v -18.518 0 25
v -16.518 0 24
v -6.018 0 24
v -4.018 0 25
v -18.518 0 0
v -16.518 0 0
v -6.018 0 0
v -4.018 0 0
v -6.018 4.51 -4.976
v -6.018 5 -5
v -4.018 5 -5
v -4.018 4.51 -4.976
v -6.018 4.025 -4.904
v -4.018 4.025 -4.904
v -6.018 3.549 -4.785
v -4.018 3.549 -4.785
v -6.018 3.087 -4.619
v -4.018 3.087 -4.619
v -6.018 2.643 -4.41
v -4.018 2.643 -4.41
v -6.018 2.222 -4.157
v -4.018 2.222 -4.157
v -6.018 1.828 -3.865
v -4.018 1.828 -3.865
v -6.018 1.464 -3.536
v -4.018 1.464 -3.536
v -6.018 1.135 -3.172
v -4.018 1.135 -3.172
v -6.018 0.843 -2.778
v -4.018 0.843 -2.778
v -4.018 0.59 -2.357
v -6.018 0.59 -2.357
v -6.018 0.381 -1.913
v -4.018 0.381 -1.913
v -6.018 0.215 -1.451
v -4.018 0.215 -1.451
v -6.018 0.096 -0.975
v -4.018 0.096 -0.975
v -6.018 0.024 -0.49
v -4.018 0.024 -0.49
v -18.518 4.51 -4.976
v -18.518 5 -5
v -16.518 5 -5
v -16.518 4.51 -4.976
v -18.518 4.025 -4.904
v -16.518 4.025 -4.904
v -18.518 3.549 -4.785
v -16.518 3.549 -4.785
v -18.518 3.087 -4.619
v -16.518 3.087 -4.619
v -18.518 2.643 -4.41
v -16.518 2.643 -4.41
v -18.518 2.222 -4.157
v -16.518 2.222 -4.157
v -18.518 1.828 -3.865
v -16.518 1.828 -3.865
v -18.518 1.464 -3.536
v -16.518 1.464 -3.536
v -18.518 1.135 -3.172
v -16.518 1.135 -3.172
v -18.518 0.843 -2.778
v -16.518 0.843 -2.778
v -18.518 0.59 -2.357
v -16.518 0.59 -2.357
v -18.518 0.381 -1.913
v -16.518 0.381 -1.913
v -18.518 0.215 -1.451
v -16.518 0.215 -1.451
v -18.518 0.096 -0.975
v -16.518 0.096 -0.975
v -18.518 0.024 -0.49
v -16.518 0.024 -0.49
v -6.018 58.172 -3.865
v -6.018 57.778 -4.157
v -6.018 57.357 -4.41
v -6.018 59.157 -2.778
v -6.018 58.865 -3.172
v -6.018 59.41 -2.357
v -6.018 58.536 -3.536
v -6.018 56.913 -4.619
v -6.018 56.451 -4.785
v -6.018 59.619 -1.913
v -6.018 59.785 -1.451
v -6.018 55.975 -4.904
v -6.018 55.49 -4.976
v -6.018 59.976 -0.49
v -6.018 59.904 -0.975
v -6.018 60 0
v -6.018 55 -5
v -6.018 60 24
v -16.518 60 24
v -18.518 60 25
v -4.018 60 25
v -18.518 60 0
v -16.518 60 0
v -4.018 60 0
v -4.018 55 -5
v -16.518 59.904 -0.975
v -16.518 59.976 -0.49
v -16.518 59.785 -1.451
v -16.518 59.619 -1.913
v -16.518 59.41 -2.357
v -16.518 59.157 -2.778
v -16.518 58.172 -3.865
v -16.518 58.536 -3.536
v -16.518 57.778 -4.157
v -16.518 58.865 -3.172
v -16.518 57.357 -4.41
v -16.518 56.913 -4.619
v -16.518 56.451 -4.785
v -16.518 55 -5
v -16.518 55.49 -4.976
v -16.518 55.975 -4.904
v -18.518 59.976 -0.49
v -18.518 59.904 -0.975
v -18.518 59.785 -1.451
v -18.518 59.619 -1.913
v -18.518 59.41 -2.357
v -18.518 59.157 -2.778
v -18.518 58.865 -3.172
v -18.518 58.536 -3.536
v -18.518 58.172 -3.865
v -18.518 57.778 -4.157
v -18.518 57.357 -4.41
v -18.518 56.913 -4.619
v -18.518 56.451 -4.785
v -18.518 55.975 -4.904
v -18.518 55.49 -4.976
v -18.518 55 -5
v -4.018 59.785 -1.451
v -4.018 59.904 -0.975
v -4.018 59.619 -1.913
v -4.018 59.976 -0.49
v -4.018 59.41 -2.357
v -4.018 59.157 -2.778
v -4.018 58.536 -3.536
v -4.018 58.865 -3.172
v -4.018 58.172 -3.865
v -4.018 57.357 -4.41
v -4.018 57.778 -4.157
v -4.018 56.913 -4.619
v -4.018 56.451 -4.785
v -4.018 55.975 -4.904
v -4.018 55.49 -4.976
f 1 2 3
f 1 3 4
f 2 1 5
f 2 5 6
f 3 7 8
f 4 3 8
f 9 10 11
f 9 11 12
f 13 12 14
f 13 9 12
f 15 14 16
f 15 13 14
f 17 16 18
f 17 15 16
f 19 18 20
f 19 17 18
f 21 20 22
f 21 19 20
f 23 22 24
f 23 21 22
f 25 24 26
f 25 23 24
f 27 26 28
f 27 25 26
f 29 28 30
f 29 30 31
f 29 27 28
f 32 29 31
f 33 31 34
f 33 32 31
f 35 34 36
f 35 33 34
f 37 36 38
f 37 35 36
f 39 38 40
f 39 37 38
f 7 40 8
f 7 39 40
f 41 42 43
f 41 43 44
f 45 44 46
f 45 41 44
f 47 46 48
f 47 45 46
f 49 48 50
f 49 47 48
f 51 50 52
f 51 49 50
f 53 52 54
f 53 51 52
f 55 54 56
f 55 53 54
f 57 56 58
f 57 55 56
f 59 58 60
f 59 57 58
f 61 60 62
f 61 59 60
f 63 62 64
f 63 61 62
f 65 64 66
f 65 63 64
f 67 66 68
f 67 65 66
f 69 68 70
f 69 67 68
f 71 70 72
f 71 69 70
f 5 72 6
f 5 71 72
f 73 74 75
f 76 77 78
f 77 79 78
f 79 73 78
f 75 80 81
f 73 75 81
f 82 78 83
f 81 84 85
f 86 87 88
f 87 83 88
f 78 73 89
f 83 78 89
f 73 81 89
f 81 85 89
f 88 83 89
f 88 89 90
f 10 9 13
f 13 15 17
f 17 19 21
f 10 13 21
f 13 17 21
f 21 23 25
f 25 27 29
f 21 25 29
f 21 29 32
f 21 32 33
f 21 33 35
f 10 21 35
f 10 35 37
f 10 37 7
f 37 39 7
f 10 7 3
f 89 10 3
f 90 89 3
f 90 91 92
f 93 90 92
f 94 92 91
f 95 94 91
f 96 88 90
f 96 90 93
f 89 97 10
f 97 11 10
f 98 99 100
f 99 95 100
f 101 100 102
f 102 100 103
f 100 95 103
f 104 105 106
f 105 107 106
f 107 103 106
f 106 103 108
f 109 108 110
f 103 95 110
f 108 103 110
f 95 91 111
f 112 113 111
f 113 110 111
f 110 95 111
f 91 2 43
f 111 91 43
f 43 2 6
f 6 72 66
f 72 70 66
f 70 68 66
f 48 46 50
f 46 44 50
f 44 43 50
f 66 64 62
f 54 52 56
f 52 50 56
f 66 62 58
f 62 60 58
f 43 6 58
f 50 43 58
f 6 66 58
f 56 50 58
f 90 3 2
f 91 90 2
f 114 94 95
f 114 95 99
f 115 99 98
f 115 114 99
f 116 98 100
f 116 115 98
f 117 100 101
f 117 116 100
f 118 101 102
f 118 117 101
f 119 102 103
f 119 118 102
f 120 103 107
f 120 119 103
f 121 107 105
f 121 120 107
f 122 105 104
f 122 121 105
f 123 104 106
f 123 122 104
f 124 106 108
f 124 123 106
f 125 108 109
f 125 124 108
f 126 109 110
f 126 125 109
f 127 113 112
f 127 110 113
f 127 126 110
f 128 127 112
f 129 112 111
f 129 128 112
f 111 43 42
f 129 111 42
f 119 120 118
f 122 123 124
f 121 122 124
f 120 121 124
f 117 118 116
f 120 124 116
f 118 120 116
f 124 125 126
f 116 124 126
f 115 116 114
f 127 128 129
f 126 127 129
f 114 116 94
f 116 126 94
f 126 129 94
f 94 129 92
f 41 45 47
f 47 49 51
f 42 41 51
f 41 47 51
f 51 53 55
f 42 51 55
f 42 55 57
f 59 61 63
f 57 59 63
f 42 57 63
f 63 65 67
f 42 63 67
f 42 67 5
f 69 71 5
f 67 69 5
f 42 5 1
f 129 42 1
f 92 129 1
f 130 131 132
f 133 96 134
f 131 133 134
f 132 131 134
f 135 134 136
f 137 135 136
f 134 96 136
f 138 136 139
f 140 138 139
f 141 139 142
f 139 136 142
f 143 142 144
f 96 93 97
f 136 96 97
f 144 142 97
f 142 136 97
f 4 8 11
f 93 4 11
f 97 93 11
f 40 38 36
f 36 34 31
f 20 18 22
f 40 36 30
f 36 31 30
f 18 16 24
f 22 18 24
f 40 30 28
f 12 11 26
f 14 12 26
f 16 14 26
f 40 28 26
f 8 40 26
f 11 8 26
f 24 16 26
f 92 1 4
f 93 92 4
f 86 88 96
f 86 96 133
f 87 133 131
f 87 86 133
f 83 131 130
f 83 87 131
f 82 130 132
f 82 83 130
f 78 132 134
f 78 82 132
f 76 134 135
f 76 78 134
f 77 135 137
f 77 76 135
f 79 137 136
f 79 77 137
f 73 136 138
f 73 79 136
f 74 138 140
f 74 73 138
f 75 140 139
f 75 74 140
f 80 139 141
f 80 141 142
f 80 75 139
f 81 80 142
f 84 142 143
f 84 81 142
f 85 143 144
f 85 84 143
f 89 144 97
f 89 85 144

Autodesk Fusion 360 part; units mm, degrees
sketch "Sketch1" plane through (0, 0, 0) normal (0, 1, 0) x (1, 0, 0)
  line L0 (-18.5178, -25) -> (-4.0178, -25)
  line L1 (-4.0178, -25) -> (-4.0178, 5)
  line L2 (-4.0178, 5) -> (-18.5178, 5)
  line L3 (-18.5178, 5) -> (-18.5178, -25)
  line L4 (-16.5178, 5) -> (-6.0178, 5)
  line L5 (-6.0178, 5) -> (-6.0178, -24)
  line L6 (-6.0178, -24) -> (-16.5178, -24)
  line L7 (-16.5178, -24) -> (-16.5178, 5)
  dimension "d1" = 14.5
  dimension "d2" = 30
  dimension "d3" = 10.5
  dimension "d4" = 2
  dimension "d5" = 1
extrude "Extrude1" add sketch "Sketch1" along normal blind 60 contours L0 L1 L2 L3 L5 L6 L7
fillet "Fillet1" radius 5 1 edges at (-5.0178, 0, -5)
fillet "Fillet2" radius 5 1 edges at (-17.5178, 0, -5)
fillet "Fillet3" radius 5 1 edges at (-17.5178, 60, -5)
fillet "Fillet4" radius 5 1 edges at (-5.0178, 60, -5)
